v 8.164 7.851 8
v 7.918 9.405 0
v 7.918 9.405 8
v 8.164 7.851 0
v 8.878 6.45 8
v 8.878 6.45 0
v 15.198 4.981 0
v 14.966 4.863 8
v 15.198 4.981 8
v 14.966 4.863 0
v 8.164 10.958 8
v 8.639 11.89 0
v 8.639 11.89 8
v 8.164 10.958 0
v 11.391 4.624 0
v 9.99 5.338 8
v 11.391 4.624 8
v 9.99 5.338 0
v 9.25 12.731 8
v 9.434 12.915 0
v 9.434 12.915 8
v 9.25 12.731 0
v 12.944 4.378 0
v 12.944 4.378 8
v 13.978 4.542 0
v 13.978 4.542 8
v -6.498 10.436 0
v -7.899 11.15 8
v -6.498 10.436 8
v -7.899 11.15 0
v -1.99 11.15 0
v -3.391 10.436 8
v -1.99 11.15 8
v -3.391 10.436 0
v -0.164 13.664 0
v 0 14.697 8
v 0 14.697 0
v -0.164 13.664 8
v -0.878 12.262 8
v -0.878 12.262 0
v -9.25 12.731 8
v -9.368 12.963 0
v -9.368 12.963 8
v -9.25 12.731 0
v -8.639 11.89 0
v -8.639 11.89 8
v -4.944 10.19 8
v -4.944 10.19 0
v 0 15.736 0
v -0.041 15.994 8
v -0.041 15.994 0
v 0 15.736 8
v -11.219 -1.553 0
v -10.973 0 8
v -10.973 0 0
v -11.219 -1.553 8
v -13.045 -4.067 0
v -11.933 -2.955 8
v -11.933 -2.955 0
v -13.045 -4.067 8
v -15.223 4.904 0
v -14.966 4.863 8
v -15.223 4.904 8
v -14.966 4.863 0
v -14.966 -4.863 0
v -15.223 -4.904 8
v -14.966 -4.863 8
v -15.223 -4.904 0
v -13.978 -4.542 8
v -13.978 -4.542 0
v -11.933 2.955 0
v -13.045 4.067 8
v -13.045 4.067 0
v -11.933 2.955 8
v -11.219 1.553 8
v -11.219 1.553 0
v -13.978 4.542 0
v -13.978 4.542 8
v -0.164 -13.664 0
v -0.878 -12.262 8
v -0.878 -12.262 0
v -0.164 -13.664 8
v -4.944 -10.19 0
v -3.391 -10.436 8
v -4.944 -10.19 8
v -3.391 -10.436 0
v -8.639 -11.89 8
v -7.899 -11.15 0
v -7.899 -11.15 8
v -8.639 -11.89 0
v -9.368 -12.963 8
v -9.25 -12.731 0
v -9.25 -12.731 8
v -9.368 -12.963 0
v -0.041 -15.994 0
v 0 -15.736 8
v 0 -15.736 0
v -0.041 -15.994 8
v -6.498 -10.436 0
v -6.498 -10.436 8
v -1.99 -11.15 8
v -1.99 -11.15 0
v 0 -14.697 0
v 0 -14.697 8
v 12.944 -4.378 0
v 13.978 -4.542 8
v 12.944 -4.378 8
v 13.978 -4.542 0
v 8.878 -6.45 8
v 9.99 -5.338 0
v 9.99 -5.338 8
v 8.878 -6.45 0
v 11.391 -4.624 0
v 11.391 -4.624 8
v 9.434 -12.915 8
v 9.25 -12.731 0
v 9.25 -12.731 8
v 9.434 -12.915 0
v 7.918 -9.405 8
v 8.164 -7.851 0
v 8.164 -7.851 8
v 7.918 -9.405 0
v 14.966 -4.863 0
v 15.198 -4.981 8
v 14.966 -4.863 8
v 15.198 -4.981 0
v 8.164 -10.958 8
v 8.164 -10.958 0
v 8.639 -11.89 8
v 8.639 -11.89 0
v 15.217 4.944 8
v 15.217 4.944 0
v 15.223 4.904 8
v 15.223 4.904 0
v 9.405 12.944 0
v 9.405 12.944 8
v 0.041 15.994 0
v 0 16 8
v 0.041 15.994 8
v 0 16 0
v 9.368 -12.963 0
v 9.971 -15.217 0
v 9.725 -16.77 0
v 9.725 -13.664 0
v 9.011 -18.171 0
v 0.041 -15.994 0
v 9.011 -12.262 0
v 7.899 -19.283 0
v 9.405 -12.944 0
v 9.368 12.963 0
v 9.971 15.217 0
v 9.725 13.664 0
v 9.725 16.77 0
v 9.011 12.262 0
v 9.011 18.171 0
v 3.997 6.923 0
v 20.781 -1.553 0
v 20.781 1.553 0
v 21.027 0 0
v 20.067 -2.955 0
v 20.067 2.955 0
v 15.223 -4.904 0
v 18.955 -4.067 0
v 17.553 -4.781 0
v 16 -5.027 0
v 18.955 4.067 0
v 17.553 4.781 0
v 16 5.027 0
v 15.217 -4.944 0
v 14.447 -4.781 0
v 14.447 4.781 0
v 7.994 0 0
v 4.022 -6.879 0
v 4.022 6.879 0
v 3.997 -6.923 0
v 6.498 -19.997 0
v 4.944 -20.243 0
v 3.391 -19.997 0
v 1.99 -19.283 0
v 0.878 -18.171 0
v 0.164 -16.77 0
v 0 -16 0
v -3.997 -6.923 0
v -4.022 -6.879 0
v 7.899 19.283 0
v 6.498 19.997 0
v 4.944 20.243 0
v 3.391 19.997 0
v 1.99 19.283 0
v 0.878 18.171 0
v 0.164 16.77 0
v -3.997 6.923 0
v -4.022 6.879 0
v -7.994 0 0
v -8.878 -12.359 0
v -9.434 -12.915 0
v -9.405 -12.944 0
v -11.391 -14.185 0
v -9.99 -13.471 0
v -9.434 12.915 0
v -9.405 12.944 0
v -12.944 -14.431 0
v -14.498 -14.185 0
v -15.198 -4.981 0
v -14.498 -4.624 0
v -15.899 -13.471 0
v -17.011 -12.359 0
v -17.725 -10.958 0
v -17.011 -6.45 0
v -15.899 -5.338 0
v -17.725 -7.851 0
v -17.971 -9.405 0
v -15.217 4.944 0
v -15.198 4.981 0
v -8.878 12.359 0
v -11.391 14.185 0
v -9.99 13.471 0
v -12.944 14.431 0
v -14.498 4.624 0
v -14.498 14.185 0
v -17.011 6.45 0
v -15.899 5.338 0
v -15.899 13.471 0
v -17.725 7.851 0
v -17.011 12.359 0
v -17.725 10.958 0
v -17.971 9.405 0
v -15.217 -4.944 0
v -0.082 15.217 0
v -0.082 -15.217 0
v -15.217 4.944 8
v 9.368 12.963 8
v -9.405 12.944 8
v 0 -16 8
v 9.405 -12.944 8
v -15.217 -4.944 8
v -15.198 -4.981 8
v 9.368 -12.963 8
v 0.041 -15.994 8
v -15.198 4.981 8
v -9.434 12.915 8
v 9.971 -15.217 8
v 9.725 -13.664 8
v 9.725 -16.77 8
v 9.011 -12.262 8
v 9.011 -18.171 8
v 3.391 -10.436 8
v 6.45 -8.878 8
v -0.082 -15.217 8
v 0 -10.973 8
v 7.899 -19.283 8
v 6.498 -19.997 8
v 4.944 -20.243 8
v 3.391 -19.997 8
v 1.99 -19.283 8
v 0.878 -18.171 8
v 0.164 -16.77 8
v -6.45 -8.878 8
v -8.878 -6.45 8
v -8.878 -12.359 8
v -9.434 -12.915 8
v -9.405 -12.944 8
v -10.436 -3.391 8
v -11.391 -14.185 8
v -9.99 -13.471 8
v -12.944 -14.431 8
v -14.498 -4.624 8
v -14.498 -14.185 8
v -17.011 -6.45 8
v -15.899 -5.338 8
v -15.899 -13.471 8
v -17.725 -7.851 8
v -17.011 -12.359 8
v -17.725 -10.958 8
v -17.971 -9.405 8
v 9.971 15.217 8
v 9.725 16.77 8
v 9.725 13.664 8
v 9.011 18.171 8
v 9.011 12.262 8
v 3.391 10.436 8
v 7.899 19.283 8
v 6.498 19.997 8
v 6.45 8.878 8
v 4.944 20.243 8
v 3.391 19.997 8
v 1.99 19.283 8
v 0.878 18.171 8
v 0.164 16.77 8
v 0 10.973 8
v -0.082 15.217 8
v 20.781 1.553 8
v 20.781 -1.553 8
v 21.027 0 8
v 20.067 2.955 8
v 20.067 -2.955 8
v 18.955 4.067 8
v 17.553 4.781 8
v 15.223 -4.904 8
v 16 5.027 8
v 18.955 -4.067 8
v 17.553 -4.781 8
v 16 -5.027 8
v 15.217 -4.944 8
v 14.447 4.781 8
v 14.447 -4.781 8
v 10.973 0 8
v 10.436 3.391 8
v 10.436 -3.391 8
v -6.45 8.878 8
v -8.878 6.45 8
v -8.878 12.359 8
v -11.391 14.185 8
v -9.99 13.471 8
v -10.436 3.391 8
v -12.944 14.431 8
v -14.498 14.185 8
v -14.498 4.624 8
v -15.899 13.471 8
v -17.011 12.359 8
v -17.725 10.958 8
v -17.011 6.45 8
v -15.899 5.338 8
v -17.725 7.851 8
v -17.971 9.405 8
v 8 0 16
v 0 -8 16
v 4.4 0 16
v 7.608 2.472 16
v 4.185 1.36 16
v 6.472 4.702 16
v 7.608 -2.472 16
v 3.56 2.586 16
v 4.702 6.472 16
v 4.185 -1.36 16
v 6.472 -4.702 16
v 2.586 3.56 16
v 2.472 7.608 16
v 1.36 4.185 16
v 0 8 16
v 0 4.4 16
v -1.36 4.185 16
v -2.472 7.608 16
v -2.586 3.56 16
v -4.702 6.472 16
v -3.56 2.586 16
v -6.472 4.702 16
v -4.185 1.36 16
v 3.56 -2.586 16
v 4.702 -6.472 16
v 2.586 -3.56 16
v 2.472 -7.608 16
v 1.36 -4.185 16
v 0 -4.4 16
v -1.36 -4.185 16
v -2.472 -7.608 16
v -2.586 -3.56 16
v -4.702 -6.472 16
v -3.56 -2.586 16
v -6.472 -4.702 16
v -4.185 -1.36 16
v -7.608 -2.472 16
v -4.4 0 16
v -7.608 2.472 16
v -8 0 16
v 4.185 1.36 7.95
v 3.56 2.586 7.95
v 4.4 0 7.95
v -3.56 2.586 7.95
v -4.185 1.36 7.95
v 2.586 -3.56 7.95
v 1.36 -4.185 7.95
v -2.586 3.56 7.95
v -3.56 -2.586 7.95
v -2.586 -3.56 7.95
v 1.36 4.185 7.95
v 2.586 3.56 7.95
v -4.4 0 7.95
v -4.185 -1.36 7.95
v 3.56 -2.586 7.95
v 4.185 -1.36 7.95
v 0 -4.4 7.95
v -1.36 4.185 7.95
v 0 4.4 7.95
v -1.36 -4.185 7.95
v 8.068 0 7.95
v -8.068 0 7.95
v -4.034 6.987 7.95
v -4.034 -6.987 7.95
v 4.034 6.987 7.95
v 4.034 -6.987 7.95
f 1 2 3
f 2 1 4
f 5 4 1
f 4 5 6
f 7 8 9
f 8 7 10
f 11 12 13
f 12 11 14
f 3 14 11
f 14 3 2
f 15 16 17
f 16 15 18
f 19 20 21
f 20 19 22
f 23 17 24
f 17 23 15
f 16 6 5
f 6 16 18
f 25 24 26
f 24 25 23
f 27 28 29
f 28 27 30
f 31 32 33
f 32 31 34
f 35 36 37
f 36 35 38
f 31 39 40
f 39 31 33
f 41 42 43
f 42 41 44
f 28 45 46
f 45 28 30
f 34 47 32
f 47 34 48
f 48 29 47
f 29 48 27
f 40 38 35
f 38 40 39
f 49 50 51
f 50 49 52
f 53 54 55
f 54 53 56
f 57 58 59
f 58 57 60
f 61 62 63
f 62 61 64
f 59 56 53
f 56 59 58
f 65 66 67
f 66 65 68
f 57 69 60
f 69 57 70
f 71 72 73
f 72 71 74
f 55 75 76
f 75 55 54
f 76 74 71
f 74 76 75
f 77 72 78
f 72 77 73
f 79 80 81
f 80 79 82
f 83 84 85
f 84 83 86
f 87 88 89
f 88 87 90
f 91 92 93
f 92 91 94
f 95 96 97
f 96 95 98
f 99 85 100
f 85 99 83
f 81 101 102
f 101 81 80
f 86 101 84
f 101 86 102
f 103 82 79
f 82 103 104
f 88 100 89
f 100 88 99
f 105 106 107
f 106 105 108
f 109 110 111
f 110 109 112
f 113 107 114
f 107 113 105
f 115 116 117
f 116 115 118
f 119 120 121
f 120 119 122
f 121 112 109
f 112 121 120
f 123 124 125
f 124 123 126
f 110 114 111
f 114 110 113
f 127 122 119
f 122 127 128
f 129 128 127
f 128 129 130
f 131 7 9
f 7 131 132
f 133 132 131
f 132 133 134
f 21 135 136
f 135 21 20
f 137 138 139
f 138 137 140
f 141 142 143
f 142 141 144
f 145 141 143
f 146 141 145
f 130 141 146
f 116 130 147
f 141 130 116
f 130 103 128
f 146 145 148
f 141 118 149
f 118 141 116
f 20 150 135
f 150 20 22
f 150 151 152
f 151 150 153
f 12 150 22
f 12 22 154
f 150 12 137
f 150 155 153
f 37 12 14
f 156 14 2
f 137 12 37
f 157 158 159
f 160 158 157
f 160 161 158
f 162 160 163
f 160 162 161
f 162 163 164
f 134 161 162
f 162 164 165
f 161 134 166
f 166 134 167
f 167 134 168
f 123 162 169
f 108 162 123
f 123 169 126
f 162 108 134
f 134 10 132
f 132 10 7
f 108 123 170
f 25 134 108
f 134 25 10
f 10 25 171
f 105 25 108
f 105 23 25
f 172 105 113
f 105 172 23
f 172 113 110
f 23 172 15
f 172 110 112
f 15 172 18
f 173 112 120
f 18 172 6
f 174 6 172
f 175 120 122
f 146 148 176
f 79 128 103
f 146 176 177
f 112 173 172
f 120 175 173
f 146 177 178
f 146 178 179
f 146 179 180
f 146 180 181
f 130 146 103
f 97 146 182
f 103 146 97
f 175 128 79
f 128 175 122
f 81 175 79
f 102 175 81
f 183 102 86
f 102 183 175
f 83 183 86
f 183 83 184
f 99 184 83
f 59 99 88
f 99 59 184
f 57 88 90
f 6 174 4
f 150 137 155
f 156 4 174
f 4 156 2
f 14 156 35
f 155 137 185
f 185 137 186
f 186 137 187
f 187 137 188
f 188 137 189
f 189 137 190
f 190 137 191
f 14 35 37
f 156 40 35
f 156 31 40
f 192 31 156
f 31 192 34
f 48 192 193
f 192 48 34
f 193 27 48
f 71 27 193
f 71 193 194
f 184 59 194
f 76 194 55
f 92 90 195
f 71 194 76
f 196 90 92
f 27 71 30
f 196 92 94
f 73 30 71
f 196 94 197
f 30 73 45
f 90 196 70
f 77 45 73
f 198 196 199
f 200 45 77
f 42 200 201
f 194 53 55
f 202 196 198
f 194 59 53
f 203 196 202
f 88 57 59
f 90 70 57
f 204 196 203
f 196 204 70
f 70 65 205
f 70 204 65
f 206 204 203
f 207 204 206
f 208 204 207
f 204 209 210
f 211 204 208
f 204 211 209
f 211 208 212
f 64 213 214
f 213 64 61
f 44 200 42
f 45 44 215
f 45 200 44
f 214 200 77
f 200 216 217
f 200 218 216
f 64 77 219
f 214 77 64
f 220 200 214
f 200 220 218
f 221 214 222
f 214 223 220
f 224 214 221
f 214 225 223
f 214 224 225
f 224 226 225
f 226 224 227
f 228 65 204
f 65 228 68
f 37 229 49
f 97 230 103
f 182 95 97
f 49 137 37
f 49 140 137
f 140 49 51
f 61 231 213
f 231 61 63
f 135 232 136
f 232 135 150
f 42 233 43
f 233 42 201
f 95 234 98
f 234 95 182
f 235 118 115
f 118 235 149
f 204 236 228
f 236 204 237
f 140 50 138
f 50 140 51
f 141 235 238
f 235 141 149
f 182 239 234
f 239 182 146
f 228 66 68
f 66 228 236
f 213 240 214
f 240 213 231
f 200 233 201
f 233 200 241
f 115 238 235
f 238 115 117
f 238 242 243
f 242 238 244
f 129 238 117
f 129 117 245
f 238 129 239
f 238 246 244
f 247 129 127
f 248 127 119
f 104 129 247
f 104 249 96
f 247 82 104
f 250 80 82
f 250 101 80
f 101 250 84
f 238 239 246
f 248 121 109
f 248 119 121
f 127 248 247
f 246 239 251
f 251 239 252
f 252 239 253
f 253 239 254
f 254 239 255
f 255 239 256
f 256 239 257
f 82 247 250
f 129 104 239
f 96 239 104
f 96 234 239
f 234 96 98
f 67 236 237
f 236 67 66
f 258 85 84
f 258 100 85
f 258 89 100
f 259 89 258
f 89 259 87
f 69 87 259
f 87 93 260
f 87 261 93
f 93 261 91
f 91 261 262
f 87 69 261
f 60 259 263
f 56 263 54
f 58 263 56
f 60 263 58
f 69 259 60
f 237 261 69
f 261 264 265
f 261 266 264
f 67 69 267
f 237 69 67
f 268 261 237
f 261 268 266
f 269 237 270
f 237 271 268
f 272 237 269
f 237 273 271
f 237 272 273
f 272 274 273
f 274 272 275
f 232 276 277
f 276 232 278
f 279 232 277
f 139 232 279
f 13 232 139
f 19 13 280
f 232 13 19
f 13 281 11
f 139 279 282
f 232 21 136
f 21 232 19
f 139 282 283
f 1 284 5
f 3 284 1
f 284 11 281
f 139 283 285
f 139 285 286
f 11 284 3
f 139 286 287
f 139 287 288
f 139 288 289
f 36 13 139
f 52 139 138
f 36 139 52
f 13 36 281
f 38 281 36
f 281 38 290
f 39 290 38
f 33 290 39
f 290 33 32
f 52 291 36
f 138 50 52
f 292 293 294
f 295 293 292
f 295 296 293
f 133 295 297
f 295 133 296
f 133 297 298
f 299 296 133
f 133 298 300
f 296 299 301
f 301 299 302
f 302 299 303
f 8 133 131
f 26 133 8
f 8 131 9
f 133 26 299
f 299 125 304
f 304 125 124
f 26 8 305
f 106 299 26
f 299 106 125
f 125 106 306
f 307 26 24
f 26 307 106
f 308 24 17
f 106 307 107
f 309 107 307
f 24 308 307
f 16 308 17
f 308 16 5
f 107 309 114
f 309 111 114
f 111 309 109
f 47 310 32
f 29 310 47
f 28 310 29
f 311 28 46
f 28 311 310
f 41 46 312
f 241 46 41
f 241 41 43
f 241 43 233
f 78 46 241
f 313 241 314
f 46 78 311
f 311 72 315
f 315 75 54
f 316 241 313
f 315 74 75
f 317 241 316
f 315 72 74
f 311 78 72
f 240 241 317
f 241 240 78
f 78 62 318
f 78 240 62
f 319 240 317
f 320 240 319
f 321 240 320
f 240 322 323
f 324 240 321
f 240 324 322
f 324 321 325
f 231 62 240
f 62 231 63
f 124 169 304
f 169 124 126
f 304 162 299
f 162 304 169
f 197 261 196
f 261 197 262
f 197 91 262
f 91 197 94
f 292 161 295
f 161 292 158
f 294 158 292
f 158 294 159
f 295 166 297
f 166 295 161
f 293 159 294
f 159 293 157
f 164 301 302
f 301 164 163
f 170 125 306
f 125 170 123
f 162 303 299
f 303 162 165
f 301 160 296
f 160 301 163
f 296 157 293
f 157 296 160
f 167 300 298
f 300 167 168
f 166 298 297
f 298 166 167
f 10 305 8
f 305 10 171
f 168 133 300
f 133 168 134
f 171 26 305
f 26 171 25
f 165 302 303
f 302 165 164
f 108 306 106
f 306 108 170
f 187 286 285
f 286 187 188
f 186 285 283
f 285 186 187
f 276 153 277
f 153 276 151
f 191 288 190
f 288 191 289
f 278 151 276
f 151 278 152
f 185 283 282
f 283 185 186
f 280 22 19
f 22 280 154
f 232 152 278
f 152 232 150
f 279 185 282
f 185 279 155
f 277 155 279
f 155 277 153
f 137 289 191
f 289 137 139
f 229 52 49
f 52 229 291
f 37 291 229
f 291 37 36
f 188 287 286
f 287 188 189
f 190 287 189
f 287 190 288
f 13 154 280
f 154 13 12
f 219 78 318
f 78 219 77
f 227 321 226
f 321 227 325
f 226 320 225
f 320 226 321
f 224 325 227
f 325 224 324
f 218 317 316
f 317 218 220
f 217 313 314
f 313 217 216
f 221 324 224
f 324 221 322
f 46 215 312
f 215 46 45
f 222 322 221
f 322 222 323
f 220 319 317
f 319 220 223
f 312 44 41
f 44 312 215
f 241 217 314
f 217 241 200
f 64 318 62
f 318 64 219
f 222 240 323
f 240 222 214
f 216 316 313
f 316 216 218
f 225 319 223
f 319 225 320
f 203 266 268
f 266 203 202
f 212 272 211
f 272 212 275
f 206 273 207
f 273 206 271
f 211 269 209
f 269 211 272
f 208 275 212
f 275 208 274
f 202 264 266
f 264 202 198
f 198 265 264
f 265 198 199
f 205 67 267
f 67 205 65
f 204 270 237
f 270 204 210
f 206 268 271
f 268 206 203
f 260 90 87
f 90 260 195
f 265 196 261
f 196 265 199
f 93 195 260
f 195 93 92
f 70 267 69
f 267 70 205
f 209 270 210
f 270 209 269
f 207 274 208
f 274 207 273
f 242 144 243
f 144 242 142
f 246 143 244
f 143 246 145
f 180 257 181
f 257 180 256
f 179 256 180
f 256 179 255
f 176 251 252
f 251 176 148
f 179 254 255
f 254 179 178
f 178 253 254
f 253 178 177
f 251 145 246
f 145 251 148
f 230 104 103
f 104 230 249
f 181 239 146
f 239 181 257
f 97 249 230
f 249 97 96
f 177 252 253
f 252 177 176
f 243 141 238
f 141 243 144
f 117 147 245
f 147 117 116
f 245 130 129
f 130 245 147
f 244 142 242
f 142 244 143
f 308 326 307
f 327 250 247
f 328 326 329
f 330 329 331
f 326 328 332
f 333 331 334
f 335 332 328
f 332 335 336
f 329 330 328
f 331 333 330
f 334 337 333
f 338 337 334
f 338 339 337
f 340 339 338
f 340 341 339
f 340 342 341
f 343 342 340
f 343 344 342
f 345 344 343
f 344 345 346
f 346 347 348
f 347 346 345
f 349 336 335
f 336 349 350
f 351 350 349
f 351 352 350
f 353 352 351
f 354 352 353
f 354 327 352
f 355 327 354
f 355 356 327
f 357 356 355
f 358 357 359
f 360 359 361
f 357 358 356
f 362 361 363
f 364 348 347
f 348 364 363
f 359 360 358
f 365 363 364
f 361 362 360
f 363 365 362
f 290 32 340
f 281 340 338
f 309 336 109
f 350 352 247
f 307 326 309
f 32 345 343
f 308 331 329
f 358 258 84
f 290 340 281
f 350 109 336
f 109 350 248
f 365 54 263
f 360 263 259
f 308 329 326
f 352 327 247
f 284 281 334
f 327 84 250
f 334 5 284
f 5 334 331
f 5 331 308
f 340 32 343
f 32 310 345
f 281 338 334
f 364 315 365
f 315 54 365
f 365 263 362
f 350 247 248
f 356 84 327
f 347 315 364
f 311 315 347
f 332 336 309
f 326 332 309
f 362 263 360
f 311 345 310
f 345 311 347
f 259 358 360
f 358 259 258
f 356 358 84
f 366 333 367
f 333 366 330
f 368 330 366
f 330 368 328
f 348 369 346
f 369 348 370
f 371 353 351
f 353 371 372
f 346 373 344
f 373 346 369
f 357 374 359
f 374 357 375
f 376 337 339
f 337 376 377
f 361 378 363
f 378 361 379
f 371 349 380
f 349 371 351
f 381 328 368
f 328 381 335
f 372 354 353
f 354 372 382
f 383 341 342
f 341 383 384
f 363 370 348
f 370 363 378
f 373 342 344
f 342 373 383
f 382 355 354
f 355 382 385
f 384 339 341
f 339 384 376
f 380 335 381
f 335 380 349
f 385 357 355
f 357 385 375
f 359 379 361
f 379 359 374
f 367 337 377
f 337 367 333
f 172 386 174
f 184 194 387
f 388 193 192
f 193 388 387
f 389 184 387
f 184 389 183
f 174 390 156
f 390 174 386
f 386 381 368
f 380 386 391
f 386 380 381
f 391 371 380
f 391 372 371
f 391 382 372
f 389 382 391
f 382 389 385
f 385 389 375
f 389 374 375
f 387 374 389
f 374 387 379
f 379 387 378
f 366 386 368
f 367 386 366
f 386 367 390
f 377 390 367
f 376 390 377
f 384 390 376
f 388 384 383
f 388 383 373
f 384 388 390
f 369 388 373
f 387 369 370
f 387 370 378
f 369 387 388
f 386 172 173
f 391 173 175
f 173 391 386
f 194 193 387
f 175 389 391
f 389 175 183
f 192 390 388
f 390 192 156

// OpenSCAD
// file: boltHead.scad
function boltHead(d)=lookup(d,[
[2,4],
[2.5,5],
[3,5.5],
[3.5,6],
[4,7],
[5,8],
[6,10],
[7,11],
[8,13],
[10,17],
[12,19],
[14,22],
[16,24],
[18,27],
[20,30],
[22,32],
[24,36],
[27,41],
[30,46],
[33,50],
[36,55],
[39,60],
[42,65],
[45,70],
[48,75],
[52,80],
[56,85],
[60,90],
[64,95]
]);
// main file
include <boltHead.scad>

knob(diameter=8,lobes=5);
//test piece with 5% shrinkage

module knob(diameter=10,lobes=5){
    assert(lobes>3,"number of lobes must be greater than 3");
    height=diameter;
    pcd=4*diameter;
    lobeDiameter=PI*pcd/2/lobes;
    difference(){
        translate([0,0,diameter/2])union(){
            translate([0,0,diameter/2])cylinder(h=diameter,r2=diameter,r1=(pcd-lobeDiameter)/2,$fn=20); //hub
            difference(){
                cylinder(h=height,d=pcd,$fn=20,center=true);
                for(i=[0:lobes-1])
                    rotate([0,0,180/lobes+i*360/lobes])translate([pcd/2,0,0])
                    cylinder(h=2*height,d=lobeDiameter,$fn=20,center=true);   
            }

            for(i=[0:lobes-1]){ rotate([0,0,i*360/lobes])translate([2*diameter,0,0])
                cylinder(h=height,d=lobeDiameter,$fn=20,center=true);    
            }
        } 
        cylinder(h=3*diameter,d=1.1*diameter,$fn=20);
        translate([0,0,-0.05])    cylinder(h=8,r1=1.065/cos(30)*boltHead(8)/2,r2=1.075/cos(30)*boltHead(8)/2,$fn=6);

    }
}
